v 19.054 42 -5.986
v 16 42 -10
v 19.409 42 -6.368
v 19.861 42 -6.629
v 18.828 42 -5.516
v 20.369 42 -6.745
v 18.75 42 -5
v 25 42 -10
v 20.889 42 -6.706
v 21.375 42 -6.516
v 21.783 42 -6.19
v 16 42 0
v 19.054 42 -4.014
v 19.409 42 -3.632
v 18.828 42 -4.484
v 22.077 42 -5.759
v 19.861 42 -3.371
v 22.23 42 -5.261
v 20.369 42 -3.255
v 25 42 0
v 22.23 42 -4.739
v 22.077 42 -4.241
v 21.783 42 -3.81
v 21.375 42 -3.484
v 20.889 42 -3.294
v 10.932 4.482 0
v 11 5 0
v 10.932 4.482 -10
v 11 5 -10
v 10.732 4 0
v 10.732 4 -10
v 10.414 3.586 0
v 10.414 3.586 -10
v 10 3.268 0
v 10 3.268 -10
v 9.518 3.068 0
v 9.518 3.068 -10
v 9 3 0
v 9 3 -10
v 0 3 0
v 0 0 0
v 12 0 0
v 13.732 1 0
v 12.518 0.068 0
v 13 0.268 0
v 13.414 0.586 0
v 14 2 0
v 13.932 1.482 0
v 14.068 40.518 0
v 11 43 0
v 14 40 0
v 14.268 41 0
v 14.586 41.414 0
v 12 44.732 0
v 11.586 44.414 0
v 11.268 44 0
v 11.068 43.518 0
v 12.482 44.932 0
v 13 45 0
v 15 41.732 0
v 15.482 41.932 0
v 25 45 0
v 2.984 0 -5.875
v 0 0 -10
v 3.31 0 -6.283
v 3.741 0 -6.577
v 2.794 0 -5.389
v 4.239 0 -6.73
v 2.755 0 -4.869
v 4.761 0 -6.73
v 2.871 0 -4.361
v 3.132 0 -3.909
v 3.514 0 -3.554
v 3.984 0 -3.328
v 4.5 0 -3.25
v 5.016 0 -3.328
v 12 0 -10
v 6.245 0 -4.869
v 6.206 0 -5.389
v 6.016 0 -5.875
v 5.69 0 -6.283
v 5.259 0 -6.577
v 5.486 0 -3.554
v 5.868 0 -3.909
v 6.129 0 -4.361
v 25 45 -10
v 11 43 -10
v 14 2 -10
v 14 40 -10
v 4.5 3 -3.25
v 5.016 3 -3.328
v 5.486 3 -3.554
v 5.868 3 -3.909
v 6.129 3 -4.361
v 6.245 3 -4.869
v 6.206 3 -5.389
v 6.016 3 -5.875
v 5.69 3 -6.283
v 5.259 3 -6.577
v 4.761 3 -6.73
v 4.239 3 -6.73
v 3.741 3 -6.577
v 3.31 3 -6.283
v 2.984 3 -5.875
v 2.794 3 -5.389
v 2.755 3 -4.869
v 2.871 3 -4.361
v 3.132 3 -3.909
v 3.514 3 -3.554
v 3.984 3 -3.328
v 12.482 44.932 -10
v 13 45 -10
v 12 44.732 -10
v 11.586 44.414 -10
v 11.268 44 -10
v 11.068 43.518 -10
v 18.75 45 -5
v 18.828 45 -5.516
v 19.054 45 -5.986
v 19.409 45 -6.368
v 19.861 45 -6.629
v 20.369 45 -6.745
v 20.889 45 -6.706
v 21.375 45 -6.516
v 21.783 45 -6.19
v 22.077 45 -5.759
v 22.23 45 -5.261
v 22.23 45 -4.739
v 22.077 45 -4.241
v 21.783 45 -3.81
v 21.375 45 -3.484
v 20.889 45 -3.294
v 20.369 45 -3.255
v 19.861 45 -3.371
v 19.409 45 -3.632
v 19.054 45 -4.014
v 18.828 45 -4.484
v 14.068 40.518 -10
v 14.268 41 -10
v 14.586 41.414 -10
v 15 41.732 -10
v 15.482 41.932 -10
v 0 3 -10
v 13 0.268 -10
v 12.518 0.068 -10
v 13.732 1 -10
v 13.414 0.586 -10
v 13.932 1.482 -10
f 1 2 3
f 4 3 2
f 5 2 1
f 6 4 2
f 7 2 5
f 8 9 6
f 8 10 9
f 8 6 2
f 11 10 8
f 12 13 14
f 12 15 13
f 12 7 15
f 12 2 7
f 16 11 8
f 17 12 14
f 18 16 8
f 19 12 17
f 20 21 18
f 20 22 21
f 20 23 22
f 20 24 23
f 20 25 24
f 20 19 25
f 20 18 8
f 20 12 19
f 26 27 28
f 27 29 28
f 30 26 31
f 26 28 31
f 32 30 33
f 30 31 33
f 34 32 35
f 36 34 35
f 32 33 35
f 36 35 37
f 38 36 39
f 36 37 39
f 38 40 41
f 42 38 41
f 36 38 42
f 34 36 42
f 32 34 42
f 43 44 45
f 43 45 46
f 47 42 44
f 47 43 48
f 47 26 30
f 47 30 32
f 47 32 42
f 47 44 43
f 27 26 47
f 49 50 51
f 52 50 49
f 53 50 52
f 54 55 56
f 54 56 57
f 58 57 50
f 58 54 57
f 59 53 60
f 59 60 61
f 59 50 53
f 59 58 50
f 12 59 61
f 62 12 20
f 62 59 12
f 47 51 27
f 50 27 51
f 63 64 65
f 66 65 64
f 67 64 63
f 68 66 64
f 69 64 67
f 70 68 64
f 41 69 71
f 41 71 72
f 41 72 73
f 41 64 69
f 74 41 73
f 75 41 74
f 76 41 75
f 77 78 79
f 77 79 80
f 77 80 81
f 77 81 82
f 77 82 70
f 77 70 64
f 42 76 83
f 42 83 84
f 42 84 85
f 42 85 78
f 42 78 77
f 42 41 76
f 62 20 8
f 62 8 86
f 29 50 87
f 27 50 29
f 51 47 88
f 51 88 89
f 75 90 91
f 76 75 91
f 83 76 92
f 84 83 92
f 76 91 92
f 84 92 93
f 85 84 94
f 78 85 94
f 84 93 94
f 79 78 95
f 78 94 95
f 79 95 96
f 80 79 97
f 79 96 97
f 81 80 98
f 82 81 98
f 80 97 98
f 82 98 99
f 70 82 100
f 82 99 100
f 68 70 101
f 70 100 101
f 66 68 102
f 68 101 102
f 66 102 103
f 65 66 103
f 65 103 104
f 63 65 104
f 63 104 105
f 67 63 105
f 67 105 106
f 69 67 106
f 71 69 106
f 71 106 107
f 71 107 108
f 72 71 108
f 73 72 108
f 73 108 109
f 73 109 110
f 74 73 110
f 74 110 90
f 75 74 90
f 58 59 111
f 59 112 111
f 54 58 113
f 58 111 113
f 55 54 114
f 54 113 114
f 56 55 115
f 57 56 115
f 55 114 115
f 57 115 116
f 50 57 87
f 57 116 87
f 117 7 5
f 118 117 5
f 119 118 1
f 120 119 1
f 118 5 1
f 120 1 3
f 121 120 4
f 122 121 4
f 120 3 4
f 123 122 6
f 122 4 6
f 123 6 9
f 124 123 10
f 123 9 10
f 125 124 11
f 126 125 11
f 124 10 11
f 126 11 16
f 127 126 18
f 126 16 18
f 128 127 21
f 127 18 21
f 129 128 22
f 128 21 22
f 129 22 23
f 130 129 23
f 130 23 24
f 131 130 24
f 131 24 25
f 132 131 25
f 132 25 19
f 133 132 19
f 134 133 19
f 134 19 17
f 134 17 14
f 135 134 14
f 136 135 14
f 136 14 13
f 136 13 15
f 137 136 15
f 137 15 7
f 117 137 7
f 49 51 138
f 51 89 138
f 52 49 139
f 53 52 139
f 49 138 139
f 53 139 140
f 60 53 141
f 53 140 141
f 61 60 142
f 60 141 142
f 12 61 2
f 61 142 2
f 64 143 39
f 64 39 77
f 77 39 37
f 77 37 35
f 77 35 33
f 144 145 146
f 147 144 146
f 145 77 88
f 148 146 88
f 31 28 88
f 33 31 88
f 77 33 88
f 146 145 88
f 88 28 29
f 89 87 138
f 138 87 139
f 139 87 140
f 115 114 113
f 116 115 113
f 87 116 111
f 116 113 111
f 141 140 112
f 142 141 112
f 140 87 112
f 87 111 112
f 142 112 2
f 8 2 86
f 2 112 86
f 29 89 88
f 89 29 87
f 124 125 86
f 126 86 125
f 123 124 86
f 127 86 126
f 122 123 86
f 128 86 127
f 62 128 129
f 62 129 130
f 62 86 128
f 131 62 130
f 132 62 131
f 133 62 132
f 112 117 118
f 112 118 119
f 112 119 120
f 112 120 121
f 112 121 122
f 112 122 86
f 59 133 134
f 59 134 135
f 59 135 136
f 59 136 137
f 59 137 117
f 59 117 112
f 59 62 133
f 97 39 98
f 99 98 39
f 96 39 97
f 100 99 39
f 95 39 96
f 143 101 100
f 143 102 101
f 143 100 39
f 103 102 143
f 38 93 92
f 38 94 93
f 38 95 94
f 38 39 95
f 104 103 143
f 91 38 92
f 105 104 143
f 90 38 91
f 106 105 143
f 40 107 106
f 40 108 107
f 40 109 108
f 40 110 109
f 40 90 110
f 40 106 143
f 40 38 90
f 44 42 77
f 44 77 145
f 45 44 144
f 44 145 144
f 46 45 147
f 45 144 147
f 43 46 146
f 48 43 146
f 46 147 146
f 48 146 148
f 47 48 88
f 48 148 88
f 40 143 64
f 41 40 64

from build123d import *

# Parameters (mm, degrees)
BOSS_EXTRUDE1_DEPTH   = 10
FILLET1_R             = 2
F_3_0MM_DOWEL_HOLE1_D = 3.5
F_3_0MM_DOWEL_HOLE2_D = 3.5


with BuildPart() as part:
    # Sketch1 → Boss-Extrude1 (new body)
    with BuildSketch(Plane.XY):
        Polygon((0, 0), (14, 0), (14, 42), (25, 42), (25, 45), (11, 45), (11, 3), (0, 3), align=None)
    extrude(amount=-BOSS_EXTRUDE1_DEPTH)

    # Fillet1
    fillet1_edges = [part.edges().sort_by_distance(p)[0] for p in [
        (11, 3, -5),
        (11, 45, -5),
        (14, 42, -5),
        (14, 0, -5),
    ]]
    fillet(fillet1_edges, radius=FILLET1_R)

    # Ø3.0mm Dowel Hole1 (through all)
    with Locations(Plane(origin=(4.5, 0, -5), x_dir=(0, 0, -1), z_dir=(0, -1, 0))):
        with Locations((0, 0)):
            Hole(F_3_0MM_DOWEL_HOLE1_D / 2)

    # Ø3.0mm Dowel Hole2 (through all)
    with Locations(Plane(origin=(0, 45, 0), x_dir=(1, 0, 0), z_dir=(0, 1, 0))):
        with Locations((20.5, 5)):
            Hole(F_3_0MM_DOWEL_HOLE2_D / 2)


solid = part.part
